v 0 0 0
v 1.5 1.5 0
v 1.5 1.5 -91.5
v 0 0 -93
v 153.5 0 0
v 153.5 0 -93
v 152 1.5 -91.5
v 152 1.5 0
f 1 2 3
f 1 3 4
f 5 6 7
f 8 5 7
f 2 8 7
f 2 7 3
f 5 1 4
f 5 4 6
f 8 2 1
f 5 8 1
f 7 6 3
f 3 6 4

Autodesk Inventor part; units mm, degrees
ref_plane "YZ Plane" through (0, 0, 0) normal (1, 0, 0) x (0, 1, 0)
ref_plane "XZ Plane" through (0, 0, 0) normal (0, 1, 0) x (-1, 0, 0)
ref_plane "XY Plane" through (0, 0, 0) normal (0, 0, 1) x (1, 0, 0)
sketch "Skizze1" plane through (0, 0, 0) normal (0, 0, 1) x (1, 0, 0)
  line L0 (153.5, 0) -> (152, 1.5) projected
  line L1 (0, 0) -> (153.5, 0)
  line L2 (152, 1.5) -> (1.5, 1.5)
  line L3 (1.5, 1.5) -> (0, 0)
  dimension "d0" = 45
extrude "Extrusion1" add sketch "Skizze1" against normal blind 93
chamfer "Fase1" distance 1.5 angle 45 1 edges at (76.75, 1.5, -93)
properties part number "Zwischenplatt"
